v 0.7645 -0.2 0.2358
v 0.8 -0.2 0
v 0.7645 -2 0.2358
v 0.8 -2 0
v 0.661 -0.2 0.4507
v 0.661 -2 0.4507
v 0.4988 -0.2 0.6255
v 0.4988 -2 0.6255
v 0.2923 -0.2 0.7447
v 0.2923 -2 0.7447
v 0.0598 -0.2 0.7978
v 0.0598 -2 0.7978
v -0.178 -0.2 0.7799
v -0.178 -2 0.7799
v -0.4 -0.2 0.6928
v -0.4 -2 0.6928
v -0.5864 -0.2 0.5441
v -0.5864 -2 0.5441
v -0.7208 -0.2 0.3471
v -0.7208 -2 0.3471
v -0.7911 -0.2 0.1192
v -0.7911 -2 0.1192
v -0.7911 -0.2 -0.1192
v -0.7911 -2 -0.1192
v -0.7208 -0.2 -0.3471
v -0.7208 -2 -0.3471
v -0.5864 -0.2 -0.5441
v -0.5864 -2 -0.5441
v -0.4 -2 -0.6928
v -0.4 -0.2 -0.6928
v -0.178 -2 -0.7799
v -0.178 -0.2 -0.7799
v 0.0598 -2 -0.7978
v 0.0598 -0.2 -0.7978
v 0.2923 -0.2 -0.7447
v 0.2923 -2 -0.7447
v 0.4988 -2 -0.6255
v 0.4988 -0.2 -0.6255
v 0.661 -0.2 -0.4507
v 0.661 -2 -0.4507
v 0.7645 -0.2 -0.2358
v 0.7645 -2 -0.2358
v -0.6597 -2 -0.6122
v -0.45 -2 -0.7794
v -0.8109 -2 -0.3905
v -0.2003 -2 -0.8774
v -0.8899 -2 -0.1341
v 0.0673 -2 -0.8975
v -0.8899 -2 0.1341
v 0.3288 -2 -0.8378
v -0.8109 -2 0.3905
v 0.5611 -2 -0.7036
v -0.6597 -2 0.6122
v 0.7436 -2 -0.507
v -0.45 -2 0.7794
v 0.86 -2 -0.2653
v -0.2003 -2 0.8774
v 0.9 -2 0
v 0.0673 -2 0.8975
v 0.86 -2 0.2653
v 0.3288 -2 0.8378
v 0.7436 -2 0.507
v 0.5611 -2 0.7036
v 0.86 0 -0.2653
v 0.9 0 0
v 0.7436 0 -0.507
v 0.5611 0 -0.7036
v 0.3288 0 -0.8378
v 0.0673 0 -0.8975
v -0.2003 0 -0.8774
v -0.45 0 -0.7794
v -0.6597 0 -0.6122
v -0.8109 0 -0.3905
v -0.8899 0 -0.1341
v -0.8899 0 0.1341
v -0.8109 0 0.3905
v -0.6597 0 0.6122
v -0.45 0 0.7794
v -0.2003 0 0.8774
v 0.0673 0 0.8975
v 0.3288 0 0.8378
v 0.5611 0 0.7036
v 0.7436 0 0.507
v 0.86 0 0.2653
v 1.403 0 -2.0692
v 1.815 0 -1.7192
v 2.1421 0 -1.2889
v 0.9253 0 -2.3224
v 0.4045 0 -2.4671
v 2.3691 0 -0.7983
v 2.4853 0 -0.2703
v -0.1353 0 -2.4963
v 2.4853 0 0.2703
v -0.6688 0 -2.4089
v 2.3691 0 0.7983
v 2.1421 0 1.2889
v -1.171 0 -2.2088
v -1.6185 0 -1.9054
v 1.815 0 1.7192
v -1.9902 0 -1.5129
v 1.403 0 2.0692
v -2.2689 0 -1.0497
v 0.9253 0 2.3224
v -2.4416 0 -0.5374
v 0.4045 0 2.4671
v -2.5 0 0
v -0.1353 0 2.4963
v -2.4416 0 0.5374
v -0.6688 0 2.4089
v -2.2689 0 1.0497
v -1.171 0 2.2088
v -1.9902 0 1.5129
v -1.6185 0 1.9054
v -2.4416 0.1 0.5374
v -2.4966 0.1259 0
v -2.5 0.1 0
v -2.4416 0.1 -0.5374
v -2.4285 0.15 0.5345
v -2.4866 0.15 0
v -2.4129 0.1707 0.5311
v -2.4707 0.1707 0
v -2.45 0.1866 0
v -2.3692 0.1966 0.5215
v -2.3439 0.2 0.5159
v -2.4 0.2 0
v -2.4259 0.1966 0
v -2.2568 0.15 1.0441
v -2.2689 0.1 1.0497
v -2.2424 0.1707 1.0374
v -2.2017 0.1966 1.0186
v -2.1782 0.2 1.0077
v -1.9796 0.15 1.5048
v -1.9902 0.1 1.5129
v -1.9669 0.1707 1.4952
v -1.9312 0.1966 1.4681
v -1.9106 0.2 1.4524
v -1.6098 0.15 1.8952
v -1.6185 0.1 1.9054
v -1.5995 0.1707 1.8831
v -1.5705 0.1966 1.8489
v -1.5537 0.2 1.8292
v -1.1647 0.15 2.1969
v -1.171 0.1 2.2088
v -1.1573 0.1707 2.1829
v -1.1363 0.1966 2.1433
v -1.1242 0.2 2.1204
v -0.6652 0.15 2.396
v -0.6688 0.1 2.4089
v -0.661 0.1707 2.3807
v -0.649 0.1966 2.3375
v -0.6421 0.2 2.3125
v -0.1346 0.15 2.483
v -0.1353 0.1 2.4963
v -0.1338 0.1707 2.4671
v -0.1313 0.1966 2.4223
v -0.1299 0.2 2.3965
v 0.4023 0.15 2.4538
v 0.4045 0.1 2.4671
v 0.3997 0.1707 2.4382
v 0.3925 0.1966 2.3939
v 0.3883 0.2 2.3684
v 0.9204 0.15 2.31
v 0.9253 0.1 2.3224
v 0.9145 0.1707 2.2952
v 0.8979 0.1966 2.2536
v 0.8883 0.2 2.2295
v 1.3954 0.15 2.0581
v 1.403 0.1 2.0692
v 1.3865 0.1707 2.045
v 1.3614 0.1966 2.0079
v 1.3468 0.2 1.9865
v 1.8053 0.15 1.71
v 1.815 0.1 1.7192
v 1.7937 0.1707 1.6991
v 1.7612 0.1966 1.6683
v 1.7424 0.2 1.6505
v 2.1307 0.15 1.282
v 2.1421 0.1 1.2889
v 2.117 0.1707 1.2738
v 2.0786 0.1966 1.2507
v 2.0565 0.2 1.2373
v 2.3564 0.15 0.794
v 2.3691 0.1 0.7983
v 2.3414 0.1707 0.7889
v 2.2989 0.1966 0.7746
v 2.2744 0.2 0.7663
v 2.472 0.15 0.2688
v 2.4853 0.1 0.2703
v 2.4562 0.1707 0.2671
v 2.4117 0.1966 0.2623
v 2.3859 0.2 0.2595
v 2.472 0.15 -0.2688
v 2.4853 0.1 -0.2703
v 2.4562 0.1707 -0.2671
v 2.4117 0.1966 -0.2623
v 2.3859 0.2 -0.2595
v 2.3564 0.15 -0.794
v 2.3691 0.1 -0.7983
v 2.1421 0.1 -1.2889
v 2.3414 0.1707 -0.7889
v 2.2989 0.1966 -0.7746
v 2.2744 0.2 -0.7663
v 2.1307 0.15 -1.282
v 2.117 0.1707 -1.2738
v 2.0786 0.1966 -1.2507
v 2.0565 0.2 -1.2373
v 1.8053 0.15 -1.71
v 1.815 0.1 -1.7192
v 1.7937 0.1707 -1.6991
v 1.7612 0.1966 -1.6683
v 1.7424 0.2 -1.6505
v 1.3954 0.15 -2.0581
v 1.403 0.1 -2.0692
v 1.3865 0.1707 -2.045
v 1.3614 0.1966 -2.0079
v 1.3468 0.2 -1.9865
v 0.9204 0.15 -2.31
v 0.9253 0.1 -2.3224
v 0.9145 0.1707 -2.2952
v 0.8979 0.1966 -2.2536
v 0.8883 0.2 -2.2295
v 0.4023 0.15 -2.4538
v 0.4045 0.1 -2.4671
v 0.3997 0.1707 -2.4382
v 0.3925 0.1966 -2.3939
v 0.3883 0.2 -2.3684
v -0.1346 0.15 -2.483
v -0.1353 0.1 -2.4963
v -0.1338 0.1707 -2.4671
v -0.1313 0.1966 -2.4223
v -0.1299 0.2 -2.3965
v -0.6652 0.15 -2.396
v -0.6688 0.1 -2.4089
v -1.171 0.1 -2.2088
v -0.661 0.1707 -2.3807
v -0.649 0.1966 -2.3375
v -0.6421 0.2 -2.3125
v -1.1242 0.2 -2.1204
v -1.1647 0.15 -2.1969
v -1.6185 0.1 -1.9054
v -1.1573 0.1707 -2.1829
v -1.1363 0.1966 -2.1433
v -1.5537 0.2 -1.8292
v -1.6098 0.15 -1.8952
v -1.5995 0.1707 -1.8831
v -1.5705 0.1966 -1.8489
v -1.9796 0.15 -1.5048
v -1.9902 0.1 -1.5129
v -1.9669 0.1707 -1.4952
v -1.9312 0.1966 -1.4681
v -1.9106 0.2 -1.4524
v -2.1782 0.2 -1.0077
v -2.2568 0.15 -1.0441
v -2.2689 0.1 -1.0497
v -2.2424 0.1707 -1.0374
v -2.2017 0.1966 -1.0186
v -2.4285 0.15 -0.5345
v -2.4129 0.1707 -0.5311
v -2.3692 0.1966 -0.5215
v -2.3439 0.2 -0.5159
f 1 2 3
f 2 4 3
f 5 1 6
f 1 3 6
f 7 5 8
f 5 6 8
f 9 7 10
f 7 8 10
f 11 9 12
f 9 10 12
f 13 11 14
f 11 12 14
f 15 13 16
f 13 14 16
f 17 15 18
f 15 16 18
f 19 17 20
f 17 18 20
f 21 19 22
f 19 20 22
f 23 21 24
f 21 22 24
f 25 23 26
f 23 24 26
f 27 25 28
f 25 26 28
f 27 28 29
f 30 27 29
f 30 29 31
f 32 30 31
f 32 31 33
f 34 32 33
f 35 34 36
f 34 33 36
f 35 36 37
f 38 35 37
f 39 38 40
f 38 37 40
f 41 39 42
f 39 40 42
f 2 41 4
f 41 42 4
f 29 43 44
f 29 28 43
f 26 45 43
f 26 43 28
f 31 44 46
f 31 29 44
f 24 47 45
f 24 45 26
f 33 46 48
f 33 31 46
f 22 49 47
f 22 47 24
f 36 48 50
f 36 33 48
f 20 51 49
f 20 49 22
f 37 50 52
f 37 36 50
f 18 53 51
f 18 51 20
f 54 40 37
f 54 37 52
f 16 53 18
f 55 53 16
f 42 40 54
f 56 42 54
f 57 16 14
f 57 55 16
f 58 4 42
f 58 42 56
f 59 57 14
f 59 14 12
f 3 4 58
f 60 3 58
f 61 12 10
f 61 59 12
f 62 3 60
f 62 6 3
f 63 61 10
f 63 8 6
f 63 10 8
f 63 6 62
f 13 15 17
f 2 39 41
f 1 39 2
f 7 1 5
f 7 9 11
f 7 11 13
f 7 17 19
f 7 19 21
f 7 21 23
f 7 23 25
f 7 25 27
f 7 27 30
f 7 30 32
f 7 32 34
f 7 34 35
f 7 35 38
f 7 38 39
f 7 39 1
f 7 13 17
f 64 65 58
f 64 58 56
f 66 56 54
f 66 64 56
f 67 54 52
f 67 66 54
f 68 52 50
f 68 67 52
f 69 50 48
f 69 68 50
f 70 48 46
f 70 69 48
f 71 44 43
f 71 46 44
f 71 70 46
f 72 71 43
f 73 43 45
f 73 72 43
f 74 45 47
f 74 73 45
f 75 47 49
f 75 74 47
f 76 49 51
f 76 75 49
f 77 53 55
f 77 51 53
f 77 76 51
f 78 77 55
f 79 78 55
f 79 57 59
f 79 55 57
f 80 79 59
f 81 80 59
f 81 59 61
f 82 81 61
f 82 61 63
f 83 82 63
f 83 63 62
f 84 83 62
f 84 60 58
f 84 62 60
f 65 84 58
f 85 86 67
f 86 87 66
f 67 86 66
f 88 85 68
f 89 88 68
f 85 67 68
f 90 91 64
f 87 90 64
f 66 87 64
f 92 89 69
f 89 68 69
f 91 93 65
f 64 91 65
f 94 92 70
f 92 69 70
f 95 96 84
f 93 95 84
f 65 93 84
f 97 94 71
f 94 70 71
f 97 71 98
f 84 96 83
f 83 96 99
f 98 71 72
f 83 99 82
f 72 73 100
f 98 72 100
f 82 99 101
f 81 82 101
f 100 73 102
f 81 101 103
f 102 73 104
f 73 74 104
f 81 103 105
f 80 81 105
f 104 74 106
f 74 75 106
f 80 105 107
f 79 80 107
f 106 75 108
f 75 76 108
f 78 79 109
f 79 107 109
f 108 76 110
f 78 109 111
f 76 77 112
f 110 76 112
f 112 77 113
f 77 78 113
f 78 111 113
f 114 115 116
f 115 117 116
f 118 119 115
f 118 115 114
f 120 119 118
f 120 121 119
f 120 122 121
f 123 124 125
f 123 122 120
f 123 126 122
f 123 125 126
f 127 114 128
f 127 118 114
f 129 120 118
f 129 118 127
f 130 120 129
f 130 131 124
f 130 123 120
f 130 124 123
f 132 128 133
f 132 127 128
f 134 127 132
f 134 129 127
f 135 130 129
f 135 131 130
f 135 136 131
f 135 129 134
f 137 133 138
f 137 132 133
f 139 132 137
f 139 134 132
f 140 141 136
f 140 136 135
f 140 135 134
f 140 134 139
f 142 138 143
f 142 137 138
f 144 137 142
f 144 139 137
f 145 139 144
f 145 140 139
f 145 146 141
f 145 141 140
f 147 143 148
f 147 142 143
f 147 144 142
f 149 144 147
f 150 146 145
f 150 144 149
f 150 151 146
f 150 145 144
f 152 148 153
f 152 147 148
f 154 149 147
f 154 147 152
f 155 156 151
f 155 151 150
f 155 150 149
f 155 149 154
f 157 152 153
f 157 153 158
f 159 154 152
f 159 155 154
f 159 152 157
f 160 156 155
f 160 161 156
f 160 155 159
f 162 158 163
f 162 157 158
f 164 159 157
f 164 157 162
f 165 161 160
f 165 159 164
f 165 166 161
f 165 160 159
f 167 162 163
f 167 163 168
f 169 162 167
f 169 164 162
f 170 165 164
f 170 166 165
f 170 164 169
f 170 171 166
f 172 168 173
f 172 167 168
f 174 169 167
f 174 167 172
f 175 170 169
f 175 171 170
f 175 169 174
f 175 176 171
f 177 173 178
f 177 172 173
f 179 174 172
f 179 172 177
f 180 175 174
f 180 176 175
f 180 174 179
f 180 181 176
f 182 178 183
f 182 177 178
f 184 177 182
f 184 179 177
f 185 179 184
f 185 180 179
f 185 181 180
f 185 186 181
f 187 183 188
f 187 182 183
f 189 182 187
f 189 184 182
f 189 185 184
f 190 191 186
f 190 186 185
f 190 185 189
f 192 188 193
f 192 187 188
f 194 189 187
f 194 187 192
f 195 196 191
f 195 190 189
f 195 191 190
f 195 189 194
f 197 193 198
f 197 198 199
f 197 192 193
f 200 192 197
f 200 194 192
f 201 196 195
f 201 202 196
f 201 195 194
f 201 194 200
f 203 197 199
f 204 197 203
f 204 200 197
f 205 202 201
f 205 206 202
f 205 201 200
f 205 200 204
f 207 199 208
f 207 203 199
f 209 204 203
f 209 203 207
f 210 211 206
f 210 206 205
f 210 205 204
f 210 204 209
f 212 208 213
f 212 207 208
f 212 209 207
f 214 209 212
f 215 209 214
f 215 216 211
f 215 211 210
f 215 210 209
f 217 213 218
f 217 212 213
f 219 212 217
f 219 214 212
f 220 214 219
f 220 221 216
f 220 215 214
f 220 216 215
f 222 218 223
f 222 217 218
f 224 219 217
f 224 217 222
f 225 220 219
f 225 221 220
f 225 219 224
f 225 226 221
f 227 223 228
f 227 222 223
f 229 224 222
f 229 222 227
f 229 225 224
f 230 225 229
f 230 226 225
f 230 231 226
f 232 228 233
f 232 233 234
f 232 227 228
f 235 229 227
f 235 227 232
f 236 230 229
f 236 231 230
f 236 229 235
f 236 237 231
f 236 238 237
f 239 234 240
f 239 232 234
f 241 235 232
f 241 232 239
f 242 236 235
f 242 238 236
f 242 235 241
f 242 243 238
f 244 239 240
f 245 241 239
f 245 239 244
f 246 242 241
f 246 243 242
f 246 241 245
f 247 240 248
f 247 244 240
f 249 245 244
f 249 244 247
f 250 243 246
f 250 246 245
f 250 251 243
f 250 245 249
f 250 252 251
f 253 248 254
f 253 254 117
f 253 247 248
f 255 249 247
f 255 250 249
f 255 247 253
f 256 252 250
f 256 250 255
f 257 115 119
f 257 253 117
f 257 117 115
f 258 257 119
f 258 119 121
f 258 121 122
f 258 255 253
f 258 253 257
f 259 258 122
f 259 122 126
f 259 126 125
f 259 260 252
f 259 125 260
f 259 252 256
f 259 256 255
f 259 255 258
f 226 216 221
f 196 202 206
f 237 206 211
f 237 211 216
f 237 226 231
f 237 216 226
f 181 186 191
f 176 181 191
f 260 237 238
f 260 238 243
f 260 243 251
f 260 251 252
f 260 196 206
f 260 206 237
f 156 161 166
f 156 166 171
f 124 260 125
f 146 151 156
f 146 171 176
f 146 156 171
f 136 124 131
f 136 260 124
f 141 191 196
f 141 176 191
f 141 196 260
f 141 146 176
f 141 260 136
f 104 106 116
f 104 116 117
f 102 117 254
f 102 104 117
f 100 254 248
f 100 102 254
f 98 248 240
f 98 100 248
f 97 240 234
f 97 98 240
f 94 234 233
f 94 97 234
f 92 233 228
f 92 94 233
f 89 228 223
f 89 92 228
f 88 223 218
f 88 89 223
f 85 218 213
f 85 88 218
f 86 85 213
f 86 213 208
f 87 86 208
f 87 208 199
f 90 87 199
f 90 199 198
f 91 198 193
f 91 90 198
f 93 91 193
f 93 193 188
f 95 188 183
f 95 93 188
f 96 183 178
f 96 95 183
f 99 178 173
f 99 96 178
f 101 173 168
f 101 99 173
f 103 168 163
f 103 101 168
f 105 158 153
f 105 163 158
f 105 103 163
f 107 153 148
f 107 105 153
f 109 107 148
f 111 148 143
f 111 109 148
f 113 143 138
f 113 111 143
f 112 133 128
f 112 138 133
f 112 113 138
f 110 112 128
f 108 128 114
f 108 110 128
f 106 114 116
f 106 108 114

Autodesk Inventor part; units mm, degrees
ref_plane "YZ Plane" through (0, 0, 0) normal (1, 0, 0) x (0, 1, 0)
ref_plane "XZ Plane" through (0, 0, 0) normal (0, 1, 0) x (-1, 0, 0)
ref_plane "XY Plane" through (0, 0, 0) normal (0, 0, 1) x (1, 0, 0)
sketch "Sketch2" plane through (0, 0, 0) normal (0, 1, 0) x (-1, 0, 0)
  circle A0 centre (0, 0) radius 2.5
  dimension "d0" = 5
extrude "Extrusion1" add sketch "Sketch2" along normal blind 0.2
sketch "Sketch3" plane through (0, 0, 0) normal (0, -1, 0) x (1, 0, 0)
  circle A0 centre (0, 0) radius 0.9
  dimension "d3" = 1.8
extrude "Extrusion2" add sketch "Sketch3" along normal blind 2
sketch "Sketch4" plane through (0, -2, 0) normal (0, -1, 0) x (1, 0, 0)
  circle A0 centre (0, 0) radius 0.8
  dimension "d6" = 1.6
extrude "Extrusion3" cut sketch "Sketch4" against normal blind 1.8
fillet "Fillet1" radius 0.1 1 edges at (2.5, 0.2, 0)
properties part number "Contact"
